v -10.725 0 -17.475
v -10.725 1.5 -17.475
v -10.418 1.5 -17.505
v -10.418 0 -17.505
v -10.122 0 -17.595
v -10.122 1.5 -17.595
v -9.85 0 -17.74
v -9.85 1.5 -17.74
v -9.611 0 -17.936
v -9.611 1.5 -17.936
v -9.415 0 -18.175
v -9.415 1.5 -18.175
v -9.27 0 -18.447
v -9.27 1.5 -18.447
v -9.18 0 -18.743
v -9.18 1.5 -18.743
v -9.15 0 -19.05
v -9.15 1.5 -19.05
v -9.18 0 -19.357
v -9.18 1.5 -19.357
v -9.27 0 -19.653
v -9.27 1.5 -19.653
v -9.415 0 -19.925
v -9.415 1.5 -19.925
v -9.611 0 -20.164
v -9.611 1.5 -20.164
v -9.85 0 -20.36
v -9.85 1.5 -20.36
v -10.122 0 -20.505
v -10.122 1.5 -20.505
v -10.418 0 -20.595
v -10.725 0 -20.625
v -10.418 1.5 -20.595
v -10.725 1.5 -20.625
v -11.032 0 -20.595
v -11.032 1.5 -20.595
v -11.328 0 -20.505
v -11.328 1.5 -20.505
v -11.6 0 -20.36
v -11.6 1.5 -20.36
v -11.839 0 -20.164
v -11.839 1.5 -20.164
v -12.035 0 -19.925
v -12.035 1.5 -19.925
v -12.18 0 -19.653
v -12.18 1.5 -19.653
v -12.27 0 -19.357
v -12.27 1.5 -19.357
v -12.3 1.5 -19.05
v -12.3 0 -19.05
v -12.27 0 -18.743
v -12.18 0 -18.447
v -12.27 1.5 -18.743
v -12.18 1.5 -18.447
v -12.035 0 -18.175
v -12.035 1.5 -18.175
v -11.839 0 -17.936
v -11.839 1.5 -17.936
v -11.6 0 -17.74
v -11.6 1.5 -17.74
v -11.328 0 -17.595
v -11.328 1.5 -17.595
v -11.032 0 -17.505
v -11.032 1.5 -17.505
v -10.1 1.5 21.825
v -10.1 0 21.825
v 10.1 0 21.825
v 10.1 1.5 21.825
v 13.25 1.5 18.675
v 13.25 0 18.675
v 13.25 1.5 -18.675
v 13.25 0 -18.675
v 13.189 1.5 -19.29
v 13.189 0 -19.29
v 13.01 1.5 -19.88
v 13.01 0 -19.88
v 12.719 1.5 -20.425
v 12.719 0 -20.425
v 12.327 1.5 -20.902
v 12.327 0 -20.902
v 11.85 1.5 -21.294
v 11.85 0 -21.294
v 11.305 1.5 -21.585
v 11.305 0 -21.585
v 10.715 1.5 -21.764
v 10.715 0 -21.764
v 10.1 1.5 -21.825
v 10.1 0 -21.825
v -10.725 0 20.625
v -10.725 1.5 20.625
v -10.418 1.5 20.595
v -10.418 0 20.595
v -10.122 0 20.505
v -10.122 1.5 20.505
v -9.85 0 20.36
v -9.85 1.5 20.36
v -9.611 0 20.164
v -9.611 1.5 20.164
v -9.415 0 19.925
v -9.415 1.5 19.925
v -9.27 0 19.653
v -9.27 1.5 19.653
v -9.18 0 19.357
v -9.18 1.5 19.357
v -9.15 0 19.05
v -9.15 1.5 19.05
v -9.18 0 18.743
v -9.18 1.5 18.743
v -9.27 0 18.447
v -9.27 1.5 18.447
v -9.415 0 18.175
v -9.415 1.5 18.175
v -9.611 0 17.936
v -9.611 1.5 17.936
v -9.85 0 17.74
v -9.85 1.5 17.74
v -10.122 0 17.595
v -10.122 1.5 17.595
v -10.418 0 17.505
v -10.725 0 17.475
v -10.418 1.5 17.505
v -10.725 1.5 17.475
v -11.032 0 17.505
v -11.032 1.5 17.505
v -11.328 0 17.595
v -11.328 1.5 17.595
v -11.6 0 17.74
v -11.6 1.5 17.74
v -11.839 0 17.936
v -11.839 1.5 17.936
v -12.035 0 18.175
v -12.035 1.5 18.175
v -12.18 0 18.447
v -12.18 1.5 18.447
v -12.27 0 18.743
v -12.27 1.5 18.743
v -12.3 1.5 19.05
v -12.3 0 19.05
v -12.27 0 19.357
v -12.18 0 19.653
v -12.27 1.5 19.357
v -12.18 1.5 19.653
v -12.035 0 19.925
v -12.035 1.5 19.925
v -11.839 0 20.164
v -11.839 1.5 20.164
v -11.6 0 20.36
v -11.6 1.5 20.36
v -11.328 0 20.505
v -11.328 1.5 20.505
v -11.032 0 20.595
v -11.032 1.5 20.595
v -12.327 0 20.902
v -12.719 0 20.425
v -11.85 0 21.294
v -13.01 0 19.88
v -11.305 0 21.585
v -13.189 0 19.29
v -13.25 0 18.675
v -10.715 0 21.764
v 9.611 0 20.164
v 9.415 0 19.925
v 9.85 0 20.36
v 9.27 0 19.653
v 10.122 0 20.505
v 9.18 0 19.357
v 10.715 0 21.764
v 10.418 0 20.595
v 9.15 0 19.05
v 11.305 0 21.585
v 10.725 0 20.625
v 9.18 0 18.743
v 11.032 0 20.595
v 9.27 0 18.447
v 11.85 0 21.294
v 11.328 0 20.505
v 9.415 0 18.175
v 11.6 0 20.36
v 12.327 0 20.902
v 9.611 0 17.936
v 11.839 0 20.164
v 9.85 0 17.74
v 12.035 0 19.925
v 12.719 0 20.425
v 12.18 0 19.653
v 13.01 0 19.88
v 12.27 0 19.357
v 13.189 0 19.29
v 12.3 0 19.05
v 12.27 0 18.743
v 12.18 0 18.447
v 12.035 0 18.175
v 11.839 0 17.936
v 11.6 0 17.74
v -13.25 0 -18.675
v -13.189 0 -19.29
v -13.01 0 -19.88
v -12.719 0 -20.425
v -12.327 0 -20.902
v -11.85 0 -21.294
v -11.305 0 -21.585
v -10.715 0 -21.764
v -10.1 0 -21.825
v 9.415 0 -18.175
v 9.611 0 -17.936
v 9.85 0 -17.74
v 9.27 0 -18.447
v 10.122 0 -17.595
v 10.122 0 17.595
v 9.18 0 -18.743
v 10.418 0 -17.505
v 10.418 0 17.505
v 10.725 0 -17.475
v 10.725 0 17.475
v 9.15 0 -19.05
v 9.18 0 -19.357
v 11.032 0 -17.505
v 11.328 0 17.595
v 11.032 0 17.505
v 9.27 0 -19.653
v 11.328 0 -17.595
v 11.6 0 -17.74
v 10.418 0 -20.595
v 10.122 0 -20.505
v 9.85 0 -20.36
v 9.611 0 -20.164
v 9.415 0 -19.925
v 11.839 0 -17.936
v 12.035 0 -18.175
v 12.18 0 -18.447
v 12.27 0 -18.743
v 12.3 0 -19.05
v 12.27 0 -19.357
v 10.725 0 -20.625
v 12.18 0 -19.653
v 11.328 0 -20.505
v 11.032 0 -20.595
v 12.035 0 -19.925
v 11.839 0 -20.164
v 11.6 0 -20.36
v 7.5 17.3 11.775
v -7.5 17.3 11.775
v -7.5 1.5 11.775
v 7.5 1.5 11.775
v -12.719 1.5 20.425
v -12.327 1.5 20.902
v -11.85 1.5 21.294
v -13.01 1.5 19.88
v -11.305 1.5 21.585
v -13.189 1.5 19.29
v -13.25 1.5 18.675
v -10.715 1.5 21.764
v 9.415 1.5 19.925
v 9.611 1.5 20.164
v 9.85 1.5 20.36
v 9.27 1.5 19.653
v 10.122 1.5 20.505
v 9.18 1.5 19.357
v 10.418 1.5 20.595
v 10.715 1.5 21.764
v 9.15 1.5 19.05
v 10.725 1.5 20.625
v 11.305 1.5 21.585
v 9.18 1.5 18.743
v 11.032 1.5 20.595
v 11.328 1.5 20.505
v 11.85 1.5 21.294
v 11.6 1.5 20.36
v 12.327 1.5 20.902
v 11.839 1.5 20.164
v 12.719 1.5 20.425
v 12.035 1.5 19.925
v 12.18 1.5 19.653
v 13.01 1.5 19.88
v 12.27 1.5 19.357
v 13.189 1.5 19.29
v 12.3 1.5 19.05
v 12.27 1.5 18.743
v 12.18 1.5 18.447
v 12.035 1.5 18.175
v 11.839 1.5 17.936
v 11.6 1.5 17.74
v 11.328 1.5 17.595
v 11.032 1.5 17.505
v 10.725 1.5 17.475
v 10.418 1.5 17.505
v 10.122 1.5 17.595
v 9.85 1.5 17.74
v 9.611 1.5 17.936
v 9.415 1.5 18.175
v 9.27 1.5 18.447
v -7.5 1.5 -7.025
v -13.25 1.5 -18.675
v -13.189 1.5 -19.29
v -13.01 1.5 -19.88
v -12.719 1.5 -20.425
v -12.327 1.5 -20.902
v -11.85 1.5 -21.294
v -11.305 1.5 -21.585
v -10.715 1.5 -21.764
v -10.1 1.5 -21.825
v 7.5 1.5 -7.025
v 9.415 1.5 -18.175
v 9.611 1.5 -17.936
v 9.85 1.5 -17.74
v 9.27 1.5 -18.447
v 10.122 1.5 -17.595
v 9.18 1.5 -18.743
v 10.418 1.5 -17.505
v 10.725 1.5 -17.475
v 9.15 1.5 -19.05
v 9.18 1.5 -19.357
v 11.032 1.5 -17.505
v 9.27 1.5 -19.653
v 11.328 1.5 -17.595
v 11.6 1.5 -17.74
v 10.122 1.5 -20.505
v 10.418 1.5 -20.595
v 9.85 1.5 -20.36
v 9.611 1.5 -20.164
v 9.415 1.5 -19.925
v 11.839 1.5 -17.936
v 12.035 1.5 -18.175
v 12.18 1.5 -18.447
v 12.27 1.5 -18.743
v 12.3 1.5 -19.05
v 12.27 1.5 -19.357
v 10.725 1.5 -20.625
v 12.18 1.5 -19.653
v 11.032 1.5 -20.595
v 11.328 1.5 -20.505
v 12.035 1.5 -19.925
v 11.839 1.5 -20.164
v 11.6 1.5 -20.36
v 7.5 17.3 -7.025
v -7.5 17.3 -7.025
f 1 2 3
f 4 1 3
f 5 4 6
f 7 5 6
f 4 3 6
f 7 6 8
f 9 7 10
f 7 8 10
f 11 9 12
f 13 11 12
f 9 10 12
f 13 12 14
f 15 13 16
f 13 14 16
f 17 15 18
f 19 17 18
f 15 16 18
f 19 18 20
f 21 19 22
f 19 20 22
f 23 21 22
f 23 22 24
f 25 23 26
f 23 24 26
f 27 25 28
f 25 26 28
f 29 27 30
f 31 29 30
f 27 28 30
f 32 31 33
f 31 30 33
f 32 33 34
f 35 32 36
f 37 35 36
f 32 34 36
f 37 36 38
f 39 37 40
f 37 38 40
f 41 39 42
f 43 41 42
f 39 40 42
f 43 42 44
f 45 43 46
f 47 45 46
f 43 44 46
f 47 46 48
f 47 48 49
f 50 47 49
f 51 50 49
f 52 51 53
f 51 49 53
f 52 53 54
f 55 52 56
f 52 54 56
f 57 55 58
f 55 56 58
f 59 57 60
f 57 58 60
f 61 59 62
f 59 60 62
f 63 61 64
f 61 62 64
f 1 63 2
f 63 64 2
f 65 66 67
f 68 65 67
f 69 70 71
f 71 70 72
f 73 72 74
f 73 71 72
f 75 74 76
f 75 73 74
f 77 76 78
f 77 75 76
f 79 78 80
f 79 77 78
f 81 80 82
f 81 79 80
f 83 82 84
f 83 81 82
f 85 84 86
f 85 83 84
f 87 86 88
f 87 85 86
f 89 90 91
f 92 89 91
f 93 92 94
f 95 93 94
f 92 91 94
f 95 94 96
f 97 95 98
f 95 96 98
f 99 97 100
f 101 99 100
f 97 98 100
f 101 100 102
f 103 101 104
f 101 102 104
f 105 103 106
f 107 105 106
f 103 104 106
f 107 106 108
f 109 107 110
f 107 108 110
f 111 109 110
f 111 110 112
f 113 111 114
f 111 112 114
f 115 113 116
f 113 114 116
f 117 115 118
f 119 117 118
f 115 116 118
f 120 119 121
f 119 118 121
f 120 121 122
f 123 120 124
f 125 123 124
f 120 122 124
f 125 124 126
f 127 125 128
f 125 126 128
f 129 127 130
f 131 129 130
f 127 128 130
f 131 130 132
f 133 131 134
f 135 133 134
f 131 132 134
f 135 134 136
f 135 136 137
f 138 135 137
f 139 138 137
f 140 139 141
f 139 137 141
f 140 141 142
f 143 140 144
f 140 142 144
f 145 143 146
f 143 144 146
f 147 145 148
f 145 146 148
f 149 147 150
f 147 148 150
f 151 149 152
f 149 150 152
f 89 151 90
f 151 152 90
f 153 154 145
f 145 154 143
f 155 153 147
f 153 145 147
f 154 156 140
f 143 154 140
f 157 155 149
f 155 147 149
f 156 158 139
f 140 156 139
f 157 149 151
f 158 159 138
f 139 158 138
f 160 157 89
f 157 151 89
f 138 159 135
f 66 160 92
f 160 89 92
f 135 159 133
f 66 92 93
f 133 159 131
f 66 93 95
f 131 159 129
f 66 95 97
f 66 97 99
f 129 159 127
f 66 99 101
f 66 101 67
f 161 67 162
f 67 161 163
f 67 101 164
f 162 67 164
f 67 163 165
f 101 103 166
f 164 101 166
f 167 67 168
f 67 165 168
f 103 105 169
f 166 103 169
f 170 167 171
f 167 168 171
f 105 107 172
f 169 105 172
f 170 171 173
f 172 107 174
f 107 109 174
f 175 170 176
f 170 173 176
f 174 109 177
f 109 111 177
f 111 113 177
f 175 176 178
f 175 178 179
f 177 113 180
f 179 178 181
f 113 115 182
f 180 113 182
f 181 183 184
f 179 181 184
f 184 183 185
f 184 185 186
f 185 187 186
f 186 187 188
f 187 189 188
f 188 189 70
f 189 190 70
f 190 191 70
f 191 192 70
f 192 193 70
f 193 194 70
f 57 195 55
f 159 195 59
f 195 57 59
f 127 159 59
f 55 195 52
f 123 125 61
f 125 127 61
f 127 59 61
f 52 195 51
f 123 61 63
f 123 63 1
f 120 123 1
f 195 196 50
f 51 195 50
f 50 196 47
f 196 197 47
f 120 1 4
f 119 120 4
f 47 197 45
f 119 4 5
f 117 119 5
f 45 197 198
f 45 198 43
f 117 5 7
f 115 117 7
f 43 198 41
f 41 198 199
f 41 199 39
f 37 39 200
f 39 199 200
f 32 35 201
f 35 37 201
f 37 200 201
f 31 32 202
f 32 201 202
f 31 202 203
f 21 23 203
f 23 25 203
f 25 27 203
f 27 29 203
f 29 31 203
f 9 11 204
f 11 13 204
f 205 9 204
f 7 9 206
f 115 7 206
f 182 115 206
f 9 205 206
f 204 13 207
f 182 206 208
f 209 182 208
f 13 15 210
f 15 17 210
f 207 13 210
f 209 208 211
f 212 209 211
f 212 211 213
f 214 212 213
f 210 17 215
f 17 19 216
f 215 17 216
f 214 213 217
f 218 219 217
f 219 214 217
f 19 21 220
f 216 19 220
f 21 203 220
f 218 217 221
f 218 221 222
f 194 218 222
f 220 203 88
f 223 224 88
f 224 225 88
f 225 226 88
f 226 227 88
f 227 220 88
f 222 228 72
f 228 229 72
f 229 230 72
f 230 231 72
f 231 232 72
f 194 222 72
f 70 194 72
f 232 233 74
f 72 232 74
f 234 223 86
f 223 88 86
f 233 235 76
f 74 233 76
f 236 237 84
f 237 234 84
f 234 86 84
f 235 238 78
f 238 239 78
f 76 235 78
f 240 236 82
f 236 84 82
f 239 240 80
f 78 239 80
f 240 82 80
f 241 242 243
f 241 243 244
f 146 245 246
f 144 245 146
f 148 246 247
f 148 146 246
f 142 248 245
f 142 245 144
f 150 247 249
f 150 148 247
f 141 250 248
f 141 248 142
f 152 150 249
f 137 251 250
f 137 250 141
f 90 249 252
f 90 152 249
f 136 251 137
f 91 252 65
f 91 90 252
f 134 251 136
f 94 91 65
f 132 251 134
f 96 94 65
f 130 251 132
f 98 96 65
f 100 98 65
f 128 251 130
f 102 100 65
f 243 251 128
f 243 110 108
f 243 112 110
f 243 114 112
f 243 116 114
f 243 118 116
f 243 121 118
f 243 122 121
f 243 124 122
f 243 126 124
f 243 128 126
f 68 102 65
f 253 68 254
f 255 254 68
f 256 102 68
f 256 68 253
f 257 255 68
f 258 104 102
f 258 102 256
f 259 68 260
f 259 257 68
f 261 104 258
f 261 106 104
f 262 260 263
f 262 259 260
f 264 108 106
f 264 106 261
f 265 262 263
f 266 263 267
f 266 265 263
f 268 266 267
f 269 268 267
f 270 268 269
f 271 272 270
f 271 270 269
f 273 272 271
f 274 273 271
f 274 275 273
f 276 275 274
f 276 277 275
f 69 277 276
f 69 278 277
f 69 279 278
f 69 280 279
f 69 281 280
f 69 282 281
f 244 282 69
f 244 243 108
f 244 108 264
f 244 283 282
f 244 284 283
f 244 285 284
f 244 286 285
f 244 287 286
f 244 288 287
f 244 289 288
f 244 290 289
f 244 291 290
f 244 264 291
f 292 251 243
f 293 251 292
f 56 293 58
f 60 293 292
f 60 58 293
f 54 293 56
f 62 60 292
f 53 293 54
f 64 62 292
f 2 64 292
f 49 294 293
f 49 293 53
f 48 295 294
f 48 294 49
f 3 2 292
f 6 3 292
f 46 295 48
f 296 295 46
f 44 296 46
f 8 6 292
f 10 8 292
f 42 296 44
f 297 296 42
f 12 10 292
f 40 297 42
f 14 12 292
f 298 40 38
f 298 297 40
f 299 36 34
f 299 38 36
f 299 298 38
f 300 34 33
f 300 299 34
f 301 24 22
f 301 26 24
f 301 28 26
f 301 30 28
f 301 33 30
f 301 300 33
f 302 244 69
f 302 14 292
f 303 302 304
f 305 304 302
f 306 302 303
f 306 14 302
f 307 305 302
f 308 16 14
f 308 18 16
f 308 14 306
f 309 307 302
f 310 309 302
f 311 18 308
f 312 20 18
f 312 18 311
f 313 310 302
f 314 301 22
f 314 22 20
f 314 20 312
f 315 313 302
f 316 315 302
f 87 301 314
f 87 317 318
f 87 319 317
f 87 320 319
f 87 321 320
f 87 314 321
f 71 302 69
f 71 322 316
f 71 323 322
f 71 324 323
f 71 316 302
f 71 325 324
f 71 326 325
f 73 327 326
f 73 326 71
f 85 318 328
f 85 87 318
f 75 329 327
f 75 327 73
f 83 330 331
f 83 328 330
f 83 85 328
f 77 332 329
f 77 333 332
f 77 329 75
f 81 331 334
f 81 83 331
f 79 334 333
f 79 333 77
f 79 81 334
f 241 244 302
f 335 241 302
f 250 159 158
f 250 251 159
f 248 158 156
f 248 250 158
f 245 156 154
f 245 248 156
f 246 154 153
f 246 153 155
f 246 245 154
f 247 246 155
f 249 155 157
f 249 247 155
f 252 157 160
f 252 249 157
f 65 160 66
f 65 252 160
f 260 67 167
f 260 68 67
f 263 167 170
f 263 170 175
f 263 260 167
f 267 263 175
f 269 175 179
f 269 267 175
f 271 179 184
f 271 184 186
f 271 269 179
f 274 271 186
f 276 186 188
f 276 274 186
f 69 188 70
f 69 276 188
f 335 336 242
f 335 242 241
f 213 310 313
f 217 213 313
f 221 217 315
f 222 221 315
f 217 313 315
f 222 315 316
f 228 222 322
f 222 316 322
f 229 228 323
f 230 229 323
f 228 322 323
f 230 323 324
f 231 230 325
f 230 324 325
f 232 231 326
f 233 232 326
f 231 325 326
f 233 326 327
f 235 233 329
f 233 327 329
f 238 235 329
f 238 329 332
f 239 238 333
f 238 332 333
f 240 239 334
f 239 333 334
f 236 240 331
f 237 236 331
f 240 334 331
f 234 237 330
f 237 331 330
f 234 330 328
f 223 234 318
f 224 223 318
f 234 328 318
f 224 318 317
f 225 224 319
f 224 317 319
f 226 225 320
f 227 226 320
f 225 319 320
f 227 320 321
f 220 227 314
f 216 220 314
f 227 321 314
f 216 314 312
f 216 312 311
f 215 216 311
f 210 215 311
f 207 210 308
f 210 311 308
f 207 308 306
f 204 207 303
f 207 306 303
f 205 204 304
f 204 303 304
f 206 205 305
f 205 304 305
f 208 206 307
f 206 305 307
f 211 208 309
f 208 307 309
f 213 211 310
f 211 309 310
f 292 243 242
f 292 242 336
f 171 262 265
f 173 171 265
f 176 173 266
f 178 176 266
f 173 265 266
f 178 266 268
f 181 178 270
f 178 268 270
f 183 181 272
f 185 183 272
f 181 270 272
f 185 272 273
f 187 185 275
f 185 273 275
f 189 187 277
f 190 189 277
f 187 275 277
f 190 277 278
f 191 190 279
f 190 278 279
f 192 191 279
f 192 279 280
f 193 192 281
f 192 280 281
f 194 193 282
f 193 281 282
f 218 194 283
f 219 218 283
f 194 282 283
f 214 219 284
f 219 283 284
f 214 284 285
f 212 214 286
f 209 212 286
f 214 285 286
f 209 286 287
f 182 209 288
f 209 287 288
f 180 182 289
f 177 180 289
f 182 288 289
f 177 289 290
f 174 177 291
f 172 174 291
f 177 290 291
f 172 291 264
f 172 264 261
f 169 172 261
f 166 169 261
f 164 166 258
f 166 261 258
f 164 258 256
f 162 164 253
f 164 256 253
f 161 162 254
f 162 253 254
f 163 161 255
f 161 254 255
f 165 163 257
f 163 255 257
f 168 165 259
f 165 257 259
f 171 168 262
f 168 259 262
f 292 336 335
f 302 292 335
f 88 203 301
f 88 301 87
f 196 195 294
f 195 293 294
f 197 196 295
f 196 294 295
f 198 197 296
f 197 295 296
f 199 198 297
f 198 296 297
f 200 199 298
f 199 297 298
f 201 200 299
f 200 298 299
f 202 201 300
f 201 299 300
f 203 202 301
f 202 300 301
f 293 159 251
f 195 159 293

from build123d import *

# Parameters (mm, degrees)
SKETCH1_W           = 26.5
SKETCH1_H           = 43.65
BOSS_EXTRUDE1_DEPTH = 1.5
FILLET1_R           = 3.15
SKETCH2_R           = 1.575
CUT_EXTRUDE1_DEPTH  = 1.5
SKETCH3_W           = 15
SKETCH3_H           = 18.8
BOSS_EXTRUDE2_DEPTH = 15.8


with BuildPart() as part:
    # Sketch1 → Boss-Extrude1 (new body)
    with BuildSketch(Plane(origin=(0, 0, 0), x_dir=(1, 0, 0), z_dir=(0, 1, 0))):
        Rectangle(SKETCH1_W, SKETCH1_H)
    extrude(amount=BOSS_EXTRUDE1_DEPTH)

    # Fillet1
    fillet1_edges = [part.edges().sort_by_distance(p)[0] for p in [
        (-13.25, 0.75, -21.825),
        (13.25, 0.75, -21.825),
        (13.25, 0.75, 21.825),
        (-13.25, 0.75, 21.825),
    ]]
    fillet(fillet1_edges, radius=FILLET1_R)

    # Sketch2 → Cut-Extrude1 (cut)
    with BuildSketch(Plane(origin=(0, 1.5, 0), x_dir=(1, 0, 0), z_dir=(0, 1, 0))):
        with Locations(Location((-10.725, 19.05, 0), (0, 0, 270))):
            Circle(SKETCH2_R)
        with Locations(Location((10.725, 19.05, 0), (0, 0, 270))):
            Circle(SKETCH2_R)
        with Locations(Location((10.725, -19.05, 0), (0, 0, 270))):
            Circle(SKETCH2_R)
        with Locations(Location((-10.725, -19.05, 0), (0, 0, 270))):
            Circle(SKETCH2_R)
    extrude(amount=-CUT_EXTRUDE1_DEPTH, mode=Mode.SUBTRACT)

    # Sketch3 → Boss-Extrude2 (add)
    with BuildSketch(Plane(origin=(0, 1.5, 0), x_dir=(1, 0, 0), z_dir=(0, 1, 0))):
        with Locations((0, -2.375)):
            Rectangle(SKETCH3_W, SKETCH3_H)
    extrude(amount=BOSS_EXTRUDE2_DEPTH)


solid = part.part
